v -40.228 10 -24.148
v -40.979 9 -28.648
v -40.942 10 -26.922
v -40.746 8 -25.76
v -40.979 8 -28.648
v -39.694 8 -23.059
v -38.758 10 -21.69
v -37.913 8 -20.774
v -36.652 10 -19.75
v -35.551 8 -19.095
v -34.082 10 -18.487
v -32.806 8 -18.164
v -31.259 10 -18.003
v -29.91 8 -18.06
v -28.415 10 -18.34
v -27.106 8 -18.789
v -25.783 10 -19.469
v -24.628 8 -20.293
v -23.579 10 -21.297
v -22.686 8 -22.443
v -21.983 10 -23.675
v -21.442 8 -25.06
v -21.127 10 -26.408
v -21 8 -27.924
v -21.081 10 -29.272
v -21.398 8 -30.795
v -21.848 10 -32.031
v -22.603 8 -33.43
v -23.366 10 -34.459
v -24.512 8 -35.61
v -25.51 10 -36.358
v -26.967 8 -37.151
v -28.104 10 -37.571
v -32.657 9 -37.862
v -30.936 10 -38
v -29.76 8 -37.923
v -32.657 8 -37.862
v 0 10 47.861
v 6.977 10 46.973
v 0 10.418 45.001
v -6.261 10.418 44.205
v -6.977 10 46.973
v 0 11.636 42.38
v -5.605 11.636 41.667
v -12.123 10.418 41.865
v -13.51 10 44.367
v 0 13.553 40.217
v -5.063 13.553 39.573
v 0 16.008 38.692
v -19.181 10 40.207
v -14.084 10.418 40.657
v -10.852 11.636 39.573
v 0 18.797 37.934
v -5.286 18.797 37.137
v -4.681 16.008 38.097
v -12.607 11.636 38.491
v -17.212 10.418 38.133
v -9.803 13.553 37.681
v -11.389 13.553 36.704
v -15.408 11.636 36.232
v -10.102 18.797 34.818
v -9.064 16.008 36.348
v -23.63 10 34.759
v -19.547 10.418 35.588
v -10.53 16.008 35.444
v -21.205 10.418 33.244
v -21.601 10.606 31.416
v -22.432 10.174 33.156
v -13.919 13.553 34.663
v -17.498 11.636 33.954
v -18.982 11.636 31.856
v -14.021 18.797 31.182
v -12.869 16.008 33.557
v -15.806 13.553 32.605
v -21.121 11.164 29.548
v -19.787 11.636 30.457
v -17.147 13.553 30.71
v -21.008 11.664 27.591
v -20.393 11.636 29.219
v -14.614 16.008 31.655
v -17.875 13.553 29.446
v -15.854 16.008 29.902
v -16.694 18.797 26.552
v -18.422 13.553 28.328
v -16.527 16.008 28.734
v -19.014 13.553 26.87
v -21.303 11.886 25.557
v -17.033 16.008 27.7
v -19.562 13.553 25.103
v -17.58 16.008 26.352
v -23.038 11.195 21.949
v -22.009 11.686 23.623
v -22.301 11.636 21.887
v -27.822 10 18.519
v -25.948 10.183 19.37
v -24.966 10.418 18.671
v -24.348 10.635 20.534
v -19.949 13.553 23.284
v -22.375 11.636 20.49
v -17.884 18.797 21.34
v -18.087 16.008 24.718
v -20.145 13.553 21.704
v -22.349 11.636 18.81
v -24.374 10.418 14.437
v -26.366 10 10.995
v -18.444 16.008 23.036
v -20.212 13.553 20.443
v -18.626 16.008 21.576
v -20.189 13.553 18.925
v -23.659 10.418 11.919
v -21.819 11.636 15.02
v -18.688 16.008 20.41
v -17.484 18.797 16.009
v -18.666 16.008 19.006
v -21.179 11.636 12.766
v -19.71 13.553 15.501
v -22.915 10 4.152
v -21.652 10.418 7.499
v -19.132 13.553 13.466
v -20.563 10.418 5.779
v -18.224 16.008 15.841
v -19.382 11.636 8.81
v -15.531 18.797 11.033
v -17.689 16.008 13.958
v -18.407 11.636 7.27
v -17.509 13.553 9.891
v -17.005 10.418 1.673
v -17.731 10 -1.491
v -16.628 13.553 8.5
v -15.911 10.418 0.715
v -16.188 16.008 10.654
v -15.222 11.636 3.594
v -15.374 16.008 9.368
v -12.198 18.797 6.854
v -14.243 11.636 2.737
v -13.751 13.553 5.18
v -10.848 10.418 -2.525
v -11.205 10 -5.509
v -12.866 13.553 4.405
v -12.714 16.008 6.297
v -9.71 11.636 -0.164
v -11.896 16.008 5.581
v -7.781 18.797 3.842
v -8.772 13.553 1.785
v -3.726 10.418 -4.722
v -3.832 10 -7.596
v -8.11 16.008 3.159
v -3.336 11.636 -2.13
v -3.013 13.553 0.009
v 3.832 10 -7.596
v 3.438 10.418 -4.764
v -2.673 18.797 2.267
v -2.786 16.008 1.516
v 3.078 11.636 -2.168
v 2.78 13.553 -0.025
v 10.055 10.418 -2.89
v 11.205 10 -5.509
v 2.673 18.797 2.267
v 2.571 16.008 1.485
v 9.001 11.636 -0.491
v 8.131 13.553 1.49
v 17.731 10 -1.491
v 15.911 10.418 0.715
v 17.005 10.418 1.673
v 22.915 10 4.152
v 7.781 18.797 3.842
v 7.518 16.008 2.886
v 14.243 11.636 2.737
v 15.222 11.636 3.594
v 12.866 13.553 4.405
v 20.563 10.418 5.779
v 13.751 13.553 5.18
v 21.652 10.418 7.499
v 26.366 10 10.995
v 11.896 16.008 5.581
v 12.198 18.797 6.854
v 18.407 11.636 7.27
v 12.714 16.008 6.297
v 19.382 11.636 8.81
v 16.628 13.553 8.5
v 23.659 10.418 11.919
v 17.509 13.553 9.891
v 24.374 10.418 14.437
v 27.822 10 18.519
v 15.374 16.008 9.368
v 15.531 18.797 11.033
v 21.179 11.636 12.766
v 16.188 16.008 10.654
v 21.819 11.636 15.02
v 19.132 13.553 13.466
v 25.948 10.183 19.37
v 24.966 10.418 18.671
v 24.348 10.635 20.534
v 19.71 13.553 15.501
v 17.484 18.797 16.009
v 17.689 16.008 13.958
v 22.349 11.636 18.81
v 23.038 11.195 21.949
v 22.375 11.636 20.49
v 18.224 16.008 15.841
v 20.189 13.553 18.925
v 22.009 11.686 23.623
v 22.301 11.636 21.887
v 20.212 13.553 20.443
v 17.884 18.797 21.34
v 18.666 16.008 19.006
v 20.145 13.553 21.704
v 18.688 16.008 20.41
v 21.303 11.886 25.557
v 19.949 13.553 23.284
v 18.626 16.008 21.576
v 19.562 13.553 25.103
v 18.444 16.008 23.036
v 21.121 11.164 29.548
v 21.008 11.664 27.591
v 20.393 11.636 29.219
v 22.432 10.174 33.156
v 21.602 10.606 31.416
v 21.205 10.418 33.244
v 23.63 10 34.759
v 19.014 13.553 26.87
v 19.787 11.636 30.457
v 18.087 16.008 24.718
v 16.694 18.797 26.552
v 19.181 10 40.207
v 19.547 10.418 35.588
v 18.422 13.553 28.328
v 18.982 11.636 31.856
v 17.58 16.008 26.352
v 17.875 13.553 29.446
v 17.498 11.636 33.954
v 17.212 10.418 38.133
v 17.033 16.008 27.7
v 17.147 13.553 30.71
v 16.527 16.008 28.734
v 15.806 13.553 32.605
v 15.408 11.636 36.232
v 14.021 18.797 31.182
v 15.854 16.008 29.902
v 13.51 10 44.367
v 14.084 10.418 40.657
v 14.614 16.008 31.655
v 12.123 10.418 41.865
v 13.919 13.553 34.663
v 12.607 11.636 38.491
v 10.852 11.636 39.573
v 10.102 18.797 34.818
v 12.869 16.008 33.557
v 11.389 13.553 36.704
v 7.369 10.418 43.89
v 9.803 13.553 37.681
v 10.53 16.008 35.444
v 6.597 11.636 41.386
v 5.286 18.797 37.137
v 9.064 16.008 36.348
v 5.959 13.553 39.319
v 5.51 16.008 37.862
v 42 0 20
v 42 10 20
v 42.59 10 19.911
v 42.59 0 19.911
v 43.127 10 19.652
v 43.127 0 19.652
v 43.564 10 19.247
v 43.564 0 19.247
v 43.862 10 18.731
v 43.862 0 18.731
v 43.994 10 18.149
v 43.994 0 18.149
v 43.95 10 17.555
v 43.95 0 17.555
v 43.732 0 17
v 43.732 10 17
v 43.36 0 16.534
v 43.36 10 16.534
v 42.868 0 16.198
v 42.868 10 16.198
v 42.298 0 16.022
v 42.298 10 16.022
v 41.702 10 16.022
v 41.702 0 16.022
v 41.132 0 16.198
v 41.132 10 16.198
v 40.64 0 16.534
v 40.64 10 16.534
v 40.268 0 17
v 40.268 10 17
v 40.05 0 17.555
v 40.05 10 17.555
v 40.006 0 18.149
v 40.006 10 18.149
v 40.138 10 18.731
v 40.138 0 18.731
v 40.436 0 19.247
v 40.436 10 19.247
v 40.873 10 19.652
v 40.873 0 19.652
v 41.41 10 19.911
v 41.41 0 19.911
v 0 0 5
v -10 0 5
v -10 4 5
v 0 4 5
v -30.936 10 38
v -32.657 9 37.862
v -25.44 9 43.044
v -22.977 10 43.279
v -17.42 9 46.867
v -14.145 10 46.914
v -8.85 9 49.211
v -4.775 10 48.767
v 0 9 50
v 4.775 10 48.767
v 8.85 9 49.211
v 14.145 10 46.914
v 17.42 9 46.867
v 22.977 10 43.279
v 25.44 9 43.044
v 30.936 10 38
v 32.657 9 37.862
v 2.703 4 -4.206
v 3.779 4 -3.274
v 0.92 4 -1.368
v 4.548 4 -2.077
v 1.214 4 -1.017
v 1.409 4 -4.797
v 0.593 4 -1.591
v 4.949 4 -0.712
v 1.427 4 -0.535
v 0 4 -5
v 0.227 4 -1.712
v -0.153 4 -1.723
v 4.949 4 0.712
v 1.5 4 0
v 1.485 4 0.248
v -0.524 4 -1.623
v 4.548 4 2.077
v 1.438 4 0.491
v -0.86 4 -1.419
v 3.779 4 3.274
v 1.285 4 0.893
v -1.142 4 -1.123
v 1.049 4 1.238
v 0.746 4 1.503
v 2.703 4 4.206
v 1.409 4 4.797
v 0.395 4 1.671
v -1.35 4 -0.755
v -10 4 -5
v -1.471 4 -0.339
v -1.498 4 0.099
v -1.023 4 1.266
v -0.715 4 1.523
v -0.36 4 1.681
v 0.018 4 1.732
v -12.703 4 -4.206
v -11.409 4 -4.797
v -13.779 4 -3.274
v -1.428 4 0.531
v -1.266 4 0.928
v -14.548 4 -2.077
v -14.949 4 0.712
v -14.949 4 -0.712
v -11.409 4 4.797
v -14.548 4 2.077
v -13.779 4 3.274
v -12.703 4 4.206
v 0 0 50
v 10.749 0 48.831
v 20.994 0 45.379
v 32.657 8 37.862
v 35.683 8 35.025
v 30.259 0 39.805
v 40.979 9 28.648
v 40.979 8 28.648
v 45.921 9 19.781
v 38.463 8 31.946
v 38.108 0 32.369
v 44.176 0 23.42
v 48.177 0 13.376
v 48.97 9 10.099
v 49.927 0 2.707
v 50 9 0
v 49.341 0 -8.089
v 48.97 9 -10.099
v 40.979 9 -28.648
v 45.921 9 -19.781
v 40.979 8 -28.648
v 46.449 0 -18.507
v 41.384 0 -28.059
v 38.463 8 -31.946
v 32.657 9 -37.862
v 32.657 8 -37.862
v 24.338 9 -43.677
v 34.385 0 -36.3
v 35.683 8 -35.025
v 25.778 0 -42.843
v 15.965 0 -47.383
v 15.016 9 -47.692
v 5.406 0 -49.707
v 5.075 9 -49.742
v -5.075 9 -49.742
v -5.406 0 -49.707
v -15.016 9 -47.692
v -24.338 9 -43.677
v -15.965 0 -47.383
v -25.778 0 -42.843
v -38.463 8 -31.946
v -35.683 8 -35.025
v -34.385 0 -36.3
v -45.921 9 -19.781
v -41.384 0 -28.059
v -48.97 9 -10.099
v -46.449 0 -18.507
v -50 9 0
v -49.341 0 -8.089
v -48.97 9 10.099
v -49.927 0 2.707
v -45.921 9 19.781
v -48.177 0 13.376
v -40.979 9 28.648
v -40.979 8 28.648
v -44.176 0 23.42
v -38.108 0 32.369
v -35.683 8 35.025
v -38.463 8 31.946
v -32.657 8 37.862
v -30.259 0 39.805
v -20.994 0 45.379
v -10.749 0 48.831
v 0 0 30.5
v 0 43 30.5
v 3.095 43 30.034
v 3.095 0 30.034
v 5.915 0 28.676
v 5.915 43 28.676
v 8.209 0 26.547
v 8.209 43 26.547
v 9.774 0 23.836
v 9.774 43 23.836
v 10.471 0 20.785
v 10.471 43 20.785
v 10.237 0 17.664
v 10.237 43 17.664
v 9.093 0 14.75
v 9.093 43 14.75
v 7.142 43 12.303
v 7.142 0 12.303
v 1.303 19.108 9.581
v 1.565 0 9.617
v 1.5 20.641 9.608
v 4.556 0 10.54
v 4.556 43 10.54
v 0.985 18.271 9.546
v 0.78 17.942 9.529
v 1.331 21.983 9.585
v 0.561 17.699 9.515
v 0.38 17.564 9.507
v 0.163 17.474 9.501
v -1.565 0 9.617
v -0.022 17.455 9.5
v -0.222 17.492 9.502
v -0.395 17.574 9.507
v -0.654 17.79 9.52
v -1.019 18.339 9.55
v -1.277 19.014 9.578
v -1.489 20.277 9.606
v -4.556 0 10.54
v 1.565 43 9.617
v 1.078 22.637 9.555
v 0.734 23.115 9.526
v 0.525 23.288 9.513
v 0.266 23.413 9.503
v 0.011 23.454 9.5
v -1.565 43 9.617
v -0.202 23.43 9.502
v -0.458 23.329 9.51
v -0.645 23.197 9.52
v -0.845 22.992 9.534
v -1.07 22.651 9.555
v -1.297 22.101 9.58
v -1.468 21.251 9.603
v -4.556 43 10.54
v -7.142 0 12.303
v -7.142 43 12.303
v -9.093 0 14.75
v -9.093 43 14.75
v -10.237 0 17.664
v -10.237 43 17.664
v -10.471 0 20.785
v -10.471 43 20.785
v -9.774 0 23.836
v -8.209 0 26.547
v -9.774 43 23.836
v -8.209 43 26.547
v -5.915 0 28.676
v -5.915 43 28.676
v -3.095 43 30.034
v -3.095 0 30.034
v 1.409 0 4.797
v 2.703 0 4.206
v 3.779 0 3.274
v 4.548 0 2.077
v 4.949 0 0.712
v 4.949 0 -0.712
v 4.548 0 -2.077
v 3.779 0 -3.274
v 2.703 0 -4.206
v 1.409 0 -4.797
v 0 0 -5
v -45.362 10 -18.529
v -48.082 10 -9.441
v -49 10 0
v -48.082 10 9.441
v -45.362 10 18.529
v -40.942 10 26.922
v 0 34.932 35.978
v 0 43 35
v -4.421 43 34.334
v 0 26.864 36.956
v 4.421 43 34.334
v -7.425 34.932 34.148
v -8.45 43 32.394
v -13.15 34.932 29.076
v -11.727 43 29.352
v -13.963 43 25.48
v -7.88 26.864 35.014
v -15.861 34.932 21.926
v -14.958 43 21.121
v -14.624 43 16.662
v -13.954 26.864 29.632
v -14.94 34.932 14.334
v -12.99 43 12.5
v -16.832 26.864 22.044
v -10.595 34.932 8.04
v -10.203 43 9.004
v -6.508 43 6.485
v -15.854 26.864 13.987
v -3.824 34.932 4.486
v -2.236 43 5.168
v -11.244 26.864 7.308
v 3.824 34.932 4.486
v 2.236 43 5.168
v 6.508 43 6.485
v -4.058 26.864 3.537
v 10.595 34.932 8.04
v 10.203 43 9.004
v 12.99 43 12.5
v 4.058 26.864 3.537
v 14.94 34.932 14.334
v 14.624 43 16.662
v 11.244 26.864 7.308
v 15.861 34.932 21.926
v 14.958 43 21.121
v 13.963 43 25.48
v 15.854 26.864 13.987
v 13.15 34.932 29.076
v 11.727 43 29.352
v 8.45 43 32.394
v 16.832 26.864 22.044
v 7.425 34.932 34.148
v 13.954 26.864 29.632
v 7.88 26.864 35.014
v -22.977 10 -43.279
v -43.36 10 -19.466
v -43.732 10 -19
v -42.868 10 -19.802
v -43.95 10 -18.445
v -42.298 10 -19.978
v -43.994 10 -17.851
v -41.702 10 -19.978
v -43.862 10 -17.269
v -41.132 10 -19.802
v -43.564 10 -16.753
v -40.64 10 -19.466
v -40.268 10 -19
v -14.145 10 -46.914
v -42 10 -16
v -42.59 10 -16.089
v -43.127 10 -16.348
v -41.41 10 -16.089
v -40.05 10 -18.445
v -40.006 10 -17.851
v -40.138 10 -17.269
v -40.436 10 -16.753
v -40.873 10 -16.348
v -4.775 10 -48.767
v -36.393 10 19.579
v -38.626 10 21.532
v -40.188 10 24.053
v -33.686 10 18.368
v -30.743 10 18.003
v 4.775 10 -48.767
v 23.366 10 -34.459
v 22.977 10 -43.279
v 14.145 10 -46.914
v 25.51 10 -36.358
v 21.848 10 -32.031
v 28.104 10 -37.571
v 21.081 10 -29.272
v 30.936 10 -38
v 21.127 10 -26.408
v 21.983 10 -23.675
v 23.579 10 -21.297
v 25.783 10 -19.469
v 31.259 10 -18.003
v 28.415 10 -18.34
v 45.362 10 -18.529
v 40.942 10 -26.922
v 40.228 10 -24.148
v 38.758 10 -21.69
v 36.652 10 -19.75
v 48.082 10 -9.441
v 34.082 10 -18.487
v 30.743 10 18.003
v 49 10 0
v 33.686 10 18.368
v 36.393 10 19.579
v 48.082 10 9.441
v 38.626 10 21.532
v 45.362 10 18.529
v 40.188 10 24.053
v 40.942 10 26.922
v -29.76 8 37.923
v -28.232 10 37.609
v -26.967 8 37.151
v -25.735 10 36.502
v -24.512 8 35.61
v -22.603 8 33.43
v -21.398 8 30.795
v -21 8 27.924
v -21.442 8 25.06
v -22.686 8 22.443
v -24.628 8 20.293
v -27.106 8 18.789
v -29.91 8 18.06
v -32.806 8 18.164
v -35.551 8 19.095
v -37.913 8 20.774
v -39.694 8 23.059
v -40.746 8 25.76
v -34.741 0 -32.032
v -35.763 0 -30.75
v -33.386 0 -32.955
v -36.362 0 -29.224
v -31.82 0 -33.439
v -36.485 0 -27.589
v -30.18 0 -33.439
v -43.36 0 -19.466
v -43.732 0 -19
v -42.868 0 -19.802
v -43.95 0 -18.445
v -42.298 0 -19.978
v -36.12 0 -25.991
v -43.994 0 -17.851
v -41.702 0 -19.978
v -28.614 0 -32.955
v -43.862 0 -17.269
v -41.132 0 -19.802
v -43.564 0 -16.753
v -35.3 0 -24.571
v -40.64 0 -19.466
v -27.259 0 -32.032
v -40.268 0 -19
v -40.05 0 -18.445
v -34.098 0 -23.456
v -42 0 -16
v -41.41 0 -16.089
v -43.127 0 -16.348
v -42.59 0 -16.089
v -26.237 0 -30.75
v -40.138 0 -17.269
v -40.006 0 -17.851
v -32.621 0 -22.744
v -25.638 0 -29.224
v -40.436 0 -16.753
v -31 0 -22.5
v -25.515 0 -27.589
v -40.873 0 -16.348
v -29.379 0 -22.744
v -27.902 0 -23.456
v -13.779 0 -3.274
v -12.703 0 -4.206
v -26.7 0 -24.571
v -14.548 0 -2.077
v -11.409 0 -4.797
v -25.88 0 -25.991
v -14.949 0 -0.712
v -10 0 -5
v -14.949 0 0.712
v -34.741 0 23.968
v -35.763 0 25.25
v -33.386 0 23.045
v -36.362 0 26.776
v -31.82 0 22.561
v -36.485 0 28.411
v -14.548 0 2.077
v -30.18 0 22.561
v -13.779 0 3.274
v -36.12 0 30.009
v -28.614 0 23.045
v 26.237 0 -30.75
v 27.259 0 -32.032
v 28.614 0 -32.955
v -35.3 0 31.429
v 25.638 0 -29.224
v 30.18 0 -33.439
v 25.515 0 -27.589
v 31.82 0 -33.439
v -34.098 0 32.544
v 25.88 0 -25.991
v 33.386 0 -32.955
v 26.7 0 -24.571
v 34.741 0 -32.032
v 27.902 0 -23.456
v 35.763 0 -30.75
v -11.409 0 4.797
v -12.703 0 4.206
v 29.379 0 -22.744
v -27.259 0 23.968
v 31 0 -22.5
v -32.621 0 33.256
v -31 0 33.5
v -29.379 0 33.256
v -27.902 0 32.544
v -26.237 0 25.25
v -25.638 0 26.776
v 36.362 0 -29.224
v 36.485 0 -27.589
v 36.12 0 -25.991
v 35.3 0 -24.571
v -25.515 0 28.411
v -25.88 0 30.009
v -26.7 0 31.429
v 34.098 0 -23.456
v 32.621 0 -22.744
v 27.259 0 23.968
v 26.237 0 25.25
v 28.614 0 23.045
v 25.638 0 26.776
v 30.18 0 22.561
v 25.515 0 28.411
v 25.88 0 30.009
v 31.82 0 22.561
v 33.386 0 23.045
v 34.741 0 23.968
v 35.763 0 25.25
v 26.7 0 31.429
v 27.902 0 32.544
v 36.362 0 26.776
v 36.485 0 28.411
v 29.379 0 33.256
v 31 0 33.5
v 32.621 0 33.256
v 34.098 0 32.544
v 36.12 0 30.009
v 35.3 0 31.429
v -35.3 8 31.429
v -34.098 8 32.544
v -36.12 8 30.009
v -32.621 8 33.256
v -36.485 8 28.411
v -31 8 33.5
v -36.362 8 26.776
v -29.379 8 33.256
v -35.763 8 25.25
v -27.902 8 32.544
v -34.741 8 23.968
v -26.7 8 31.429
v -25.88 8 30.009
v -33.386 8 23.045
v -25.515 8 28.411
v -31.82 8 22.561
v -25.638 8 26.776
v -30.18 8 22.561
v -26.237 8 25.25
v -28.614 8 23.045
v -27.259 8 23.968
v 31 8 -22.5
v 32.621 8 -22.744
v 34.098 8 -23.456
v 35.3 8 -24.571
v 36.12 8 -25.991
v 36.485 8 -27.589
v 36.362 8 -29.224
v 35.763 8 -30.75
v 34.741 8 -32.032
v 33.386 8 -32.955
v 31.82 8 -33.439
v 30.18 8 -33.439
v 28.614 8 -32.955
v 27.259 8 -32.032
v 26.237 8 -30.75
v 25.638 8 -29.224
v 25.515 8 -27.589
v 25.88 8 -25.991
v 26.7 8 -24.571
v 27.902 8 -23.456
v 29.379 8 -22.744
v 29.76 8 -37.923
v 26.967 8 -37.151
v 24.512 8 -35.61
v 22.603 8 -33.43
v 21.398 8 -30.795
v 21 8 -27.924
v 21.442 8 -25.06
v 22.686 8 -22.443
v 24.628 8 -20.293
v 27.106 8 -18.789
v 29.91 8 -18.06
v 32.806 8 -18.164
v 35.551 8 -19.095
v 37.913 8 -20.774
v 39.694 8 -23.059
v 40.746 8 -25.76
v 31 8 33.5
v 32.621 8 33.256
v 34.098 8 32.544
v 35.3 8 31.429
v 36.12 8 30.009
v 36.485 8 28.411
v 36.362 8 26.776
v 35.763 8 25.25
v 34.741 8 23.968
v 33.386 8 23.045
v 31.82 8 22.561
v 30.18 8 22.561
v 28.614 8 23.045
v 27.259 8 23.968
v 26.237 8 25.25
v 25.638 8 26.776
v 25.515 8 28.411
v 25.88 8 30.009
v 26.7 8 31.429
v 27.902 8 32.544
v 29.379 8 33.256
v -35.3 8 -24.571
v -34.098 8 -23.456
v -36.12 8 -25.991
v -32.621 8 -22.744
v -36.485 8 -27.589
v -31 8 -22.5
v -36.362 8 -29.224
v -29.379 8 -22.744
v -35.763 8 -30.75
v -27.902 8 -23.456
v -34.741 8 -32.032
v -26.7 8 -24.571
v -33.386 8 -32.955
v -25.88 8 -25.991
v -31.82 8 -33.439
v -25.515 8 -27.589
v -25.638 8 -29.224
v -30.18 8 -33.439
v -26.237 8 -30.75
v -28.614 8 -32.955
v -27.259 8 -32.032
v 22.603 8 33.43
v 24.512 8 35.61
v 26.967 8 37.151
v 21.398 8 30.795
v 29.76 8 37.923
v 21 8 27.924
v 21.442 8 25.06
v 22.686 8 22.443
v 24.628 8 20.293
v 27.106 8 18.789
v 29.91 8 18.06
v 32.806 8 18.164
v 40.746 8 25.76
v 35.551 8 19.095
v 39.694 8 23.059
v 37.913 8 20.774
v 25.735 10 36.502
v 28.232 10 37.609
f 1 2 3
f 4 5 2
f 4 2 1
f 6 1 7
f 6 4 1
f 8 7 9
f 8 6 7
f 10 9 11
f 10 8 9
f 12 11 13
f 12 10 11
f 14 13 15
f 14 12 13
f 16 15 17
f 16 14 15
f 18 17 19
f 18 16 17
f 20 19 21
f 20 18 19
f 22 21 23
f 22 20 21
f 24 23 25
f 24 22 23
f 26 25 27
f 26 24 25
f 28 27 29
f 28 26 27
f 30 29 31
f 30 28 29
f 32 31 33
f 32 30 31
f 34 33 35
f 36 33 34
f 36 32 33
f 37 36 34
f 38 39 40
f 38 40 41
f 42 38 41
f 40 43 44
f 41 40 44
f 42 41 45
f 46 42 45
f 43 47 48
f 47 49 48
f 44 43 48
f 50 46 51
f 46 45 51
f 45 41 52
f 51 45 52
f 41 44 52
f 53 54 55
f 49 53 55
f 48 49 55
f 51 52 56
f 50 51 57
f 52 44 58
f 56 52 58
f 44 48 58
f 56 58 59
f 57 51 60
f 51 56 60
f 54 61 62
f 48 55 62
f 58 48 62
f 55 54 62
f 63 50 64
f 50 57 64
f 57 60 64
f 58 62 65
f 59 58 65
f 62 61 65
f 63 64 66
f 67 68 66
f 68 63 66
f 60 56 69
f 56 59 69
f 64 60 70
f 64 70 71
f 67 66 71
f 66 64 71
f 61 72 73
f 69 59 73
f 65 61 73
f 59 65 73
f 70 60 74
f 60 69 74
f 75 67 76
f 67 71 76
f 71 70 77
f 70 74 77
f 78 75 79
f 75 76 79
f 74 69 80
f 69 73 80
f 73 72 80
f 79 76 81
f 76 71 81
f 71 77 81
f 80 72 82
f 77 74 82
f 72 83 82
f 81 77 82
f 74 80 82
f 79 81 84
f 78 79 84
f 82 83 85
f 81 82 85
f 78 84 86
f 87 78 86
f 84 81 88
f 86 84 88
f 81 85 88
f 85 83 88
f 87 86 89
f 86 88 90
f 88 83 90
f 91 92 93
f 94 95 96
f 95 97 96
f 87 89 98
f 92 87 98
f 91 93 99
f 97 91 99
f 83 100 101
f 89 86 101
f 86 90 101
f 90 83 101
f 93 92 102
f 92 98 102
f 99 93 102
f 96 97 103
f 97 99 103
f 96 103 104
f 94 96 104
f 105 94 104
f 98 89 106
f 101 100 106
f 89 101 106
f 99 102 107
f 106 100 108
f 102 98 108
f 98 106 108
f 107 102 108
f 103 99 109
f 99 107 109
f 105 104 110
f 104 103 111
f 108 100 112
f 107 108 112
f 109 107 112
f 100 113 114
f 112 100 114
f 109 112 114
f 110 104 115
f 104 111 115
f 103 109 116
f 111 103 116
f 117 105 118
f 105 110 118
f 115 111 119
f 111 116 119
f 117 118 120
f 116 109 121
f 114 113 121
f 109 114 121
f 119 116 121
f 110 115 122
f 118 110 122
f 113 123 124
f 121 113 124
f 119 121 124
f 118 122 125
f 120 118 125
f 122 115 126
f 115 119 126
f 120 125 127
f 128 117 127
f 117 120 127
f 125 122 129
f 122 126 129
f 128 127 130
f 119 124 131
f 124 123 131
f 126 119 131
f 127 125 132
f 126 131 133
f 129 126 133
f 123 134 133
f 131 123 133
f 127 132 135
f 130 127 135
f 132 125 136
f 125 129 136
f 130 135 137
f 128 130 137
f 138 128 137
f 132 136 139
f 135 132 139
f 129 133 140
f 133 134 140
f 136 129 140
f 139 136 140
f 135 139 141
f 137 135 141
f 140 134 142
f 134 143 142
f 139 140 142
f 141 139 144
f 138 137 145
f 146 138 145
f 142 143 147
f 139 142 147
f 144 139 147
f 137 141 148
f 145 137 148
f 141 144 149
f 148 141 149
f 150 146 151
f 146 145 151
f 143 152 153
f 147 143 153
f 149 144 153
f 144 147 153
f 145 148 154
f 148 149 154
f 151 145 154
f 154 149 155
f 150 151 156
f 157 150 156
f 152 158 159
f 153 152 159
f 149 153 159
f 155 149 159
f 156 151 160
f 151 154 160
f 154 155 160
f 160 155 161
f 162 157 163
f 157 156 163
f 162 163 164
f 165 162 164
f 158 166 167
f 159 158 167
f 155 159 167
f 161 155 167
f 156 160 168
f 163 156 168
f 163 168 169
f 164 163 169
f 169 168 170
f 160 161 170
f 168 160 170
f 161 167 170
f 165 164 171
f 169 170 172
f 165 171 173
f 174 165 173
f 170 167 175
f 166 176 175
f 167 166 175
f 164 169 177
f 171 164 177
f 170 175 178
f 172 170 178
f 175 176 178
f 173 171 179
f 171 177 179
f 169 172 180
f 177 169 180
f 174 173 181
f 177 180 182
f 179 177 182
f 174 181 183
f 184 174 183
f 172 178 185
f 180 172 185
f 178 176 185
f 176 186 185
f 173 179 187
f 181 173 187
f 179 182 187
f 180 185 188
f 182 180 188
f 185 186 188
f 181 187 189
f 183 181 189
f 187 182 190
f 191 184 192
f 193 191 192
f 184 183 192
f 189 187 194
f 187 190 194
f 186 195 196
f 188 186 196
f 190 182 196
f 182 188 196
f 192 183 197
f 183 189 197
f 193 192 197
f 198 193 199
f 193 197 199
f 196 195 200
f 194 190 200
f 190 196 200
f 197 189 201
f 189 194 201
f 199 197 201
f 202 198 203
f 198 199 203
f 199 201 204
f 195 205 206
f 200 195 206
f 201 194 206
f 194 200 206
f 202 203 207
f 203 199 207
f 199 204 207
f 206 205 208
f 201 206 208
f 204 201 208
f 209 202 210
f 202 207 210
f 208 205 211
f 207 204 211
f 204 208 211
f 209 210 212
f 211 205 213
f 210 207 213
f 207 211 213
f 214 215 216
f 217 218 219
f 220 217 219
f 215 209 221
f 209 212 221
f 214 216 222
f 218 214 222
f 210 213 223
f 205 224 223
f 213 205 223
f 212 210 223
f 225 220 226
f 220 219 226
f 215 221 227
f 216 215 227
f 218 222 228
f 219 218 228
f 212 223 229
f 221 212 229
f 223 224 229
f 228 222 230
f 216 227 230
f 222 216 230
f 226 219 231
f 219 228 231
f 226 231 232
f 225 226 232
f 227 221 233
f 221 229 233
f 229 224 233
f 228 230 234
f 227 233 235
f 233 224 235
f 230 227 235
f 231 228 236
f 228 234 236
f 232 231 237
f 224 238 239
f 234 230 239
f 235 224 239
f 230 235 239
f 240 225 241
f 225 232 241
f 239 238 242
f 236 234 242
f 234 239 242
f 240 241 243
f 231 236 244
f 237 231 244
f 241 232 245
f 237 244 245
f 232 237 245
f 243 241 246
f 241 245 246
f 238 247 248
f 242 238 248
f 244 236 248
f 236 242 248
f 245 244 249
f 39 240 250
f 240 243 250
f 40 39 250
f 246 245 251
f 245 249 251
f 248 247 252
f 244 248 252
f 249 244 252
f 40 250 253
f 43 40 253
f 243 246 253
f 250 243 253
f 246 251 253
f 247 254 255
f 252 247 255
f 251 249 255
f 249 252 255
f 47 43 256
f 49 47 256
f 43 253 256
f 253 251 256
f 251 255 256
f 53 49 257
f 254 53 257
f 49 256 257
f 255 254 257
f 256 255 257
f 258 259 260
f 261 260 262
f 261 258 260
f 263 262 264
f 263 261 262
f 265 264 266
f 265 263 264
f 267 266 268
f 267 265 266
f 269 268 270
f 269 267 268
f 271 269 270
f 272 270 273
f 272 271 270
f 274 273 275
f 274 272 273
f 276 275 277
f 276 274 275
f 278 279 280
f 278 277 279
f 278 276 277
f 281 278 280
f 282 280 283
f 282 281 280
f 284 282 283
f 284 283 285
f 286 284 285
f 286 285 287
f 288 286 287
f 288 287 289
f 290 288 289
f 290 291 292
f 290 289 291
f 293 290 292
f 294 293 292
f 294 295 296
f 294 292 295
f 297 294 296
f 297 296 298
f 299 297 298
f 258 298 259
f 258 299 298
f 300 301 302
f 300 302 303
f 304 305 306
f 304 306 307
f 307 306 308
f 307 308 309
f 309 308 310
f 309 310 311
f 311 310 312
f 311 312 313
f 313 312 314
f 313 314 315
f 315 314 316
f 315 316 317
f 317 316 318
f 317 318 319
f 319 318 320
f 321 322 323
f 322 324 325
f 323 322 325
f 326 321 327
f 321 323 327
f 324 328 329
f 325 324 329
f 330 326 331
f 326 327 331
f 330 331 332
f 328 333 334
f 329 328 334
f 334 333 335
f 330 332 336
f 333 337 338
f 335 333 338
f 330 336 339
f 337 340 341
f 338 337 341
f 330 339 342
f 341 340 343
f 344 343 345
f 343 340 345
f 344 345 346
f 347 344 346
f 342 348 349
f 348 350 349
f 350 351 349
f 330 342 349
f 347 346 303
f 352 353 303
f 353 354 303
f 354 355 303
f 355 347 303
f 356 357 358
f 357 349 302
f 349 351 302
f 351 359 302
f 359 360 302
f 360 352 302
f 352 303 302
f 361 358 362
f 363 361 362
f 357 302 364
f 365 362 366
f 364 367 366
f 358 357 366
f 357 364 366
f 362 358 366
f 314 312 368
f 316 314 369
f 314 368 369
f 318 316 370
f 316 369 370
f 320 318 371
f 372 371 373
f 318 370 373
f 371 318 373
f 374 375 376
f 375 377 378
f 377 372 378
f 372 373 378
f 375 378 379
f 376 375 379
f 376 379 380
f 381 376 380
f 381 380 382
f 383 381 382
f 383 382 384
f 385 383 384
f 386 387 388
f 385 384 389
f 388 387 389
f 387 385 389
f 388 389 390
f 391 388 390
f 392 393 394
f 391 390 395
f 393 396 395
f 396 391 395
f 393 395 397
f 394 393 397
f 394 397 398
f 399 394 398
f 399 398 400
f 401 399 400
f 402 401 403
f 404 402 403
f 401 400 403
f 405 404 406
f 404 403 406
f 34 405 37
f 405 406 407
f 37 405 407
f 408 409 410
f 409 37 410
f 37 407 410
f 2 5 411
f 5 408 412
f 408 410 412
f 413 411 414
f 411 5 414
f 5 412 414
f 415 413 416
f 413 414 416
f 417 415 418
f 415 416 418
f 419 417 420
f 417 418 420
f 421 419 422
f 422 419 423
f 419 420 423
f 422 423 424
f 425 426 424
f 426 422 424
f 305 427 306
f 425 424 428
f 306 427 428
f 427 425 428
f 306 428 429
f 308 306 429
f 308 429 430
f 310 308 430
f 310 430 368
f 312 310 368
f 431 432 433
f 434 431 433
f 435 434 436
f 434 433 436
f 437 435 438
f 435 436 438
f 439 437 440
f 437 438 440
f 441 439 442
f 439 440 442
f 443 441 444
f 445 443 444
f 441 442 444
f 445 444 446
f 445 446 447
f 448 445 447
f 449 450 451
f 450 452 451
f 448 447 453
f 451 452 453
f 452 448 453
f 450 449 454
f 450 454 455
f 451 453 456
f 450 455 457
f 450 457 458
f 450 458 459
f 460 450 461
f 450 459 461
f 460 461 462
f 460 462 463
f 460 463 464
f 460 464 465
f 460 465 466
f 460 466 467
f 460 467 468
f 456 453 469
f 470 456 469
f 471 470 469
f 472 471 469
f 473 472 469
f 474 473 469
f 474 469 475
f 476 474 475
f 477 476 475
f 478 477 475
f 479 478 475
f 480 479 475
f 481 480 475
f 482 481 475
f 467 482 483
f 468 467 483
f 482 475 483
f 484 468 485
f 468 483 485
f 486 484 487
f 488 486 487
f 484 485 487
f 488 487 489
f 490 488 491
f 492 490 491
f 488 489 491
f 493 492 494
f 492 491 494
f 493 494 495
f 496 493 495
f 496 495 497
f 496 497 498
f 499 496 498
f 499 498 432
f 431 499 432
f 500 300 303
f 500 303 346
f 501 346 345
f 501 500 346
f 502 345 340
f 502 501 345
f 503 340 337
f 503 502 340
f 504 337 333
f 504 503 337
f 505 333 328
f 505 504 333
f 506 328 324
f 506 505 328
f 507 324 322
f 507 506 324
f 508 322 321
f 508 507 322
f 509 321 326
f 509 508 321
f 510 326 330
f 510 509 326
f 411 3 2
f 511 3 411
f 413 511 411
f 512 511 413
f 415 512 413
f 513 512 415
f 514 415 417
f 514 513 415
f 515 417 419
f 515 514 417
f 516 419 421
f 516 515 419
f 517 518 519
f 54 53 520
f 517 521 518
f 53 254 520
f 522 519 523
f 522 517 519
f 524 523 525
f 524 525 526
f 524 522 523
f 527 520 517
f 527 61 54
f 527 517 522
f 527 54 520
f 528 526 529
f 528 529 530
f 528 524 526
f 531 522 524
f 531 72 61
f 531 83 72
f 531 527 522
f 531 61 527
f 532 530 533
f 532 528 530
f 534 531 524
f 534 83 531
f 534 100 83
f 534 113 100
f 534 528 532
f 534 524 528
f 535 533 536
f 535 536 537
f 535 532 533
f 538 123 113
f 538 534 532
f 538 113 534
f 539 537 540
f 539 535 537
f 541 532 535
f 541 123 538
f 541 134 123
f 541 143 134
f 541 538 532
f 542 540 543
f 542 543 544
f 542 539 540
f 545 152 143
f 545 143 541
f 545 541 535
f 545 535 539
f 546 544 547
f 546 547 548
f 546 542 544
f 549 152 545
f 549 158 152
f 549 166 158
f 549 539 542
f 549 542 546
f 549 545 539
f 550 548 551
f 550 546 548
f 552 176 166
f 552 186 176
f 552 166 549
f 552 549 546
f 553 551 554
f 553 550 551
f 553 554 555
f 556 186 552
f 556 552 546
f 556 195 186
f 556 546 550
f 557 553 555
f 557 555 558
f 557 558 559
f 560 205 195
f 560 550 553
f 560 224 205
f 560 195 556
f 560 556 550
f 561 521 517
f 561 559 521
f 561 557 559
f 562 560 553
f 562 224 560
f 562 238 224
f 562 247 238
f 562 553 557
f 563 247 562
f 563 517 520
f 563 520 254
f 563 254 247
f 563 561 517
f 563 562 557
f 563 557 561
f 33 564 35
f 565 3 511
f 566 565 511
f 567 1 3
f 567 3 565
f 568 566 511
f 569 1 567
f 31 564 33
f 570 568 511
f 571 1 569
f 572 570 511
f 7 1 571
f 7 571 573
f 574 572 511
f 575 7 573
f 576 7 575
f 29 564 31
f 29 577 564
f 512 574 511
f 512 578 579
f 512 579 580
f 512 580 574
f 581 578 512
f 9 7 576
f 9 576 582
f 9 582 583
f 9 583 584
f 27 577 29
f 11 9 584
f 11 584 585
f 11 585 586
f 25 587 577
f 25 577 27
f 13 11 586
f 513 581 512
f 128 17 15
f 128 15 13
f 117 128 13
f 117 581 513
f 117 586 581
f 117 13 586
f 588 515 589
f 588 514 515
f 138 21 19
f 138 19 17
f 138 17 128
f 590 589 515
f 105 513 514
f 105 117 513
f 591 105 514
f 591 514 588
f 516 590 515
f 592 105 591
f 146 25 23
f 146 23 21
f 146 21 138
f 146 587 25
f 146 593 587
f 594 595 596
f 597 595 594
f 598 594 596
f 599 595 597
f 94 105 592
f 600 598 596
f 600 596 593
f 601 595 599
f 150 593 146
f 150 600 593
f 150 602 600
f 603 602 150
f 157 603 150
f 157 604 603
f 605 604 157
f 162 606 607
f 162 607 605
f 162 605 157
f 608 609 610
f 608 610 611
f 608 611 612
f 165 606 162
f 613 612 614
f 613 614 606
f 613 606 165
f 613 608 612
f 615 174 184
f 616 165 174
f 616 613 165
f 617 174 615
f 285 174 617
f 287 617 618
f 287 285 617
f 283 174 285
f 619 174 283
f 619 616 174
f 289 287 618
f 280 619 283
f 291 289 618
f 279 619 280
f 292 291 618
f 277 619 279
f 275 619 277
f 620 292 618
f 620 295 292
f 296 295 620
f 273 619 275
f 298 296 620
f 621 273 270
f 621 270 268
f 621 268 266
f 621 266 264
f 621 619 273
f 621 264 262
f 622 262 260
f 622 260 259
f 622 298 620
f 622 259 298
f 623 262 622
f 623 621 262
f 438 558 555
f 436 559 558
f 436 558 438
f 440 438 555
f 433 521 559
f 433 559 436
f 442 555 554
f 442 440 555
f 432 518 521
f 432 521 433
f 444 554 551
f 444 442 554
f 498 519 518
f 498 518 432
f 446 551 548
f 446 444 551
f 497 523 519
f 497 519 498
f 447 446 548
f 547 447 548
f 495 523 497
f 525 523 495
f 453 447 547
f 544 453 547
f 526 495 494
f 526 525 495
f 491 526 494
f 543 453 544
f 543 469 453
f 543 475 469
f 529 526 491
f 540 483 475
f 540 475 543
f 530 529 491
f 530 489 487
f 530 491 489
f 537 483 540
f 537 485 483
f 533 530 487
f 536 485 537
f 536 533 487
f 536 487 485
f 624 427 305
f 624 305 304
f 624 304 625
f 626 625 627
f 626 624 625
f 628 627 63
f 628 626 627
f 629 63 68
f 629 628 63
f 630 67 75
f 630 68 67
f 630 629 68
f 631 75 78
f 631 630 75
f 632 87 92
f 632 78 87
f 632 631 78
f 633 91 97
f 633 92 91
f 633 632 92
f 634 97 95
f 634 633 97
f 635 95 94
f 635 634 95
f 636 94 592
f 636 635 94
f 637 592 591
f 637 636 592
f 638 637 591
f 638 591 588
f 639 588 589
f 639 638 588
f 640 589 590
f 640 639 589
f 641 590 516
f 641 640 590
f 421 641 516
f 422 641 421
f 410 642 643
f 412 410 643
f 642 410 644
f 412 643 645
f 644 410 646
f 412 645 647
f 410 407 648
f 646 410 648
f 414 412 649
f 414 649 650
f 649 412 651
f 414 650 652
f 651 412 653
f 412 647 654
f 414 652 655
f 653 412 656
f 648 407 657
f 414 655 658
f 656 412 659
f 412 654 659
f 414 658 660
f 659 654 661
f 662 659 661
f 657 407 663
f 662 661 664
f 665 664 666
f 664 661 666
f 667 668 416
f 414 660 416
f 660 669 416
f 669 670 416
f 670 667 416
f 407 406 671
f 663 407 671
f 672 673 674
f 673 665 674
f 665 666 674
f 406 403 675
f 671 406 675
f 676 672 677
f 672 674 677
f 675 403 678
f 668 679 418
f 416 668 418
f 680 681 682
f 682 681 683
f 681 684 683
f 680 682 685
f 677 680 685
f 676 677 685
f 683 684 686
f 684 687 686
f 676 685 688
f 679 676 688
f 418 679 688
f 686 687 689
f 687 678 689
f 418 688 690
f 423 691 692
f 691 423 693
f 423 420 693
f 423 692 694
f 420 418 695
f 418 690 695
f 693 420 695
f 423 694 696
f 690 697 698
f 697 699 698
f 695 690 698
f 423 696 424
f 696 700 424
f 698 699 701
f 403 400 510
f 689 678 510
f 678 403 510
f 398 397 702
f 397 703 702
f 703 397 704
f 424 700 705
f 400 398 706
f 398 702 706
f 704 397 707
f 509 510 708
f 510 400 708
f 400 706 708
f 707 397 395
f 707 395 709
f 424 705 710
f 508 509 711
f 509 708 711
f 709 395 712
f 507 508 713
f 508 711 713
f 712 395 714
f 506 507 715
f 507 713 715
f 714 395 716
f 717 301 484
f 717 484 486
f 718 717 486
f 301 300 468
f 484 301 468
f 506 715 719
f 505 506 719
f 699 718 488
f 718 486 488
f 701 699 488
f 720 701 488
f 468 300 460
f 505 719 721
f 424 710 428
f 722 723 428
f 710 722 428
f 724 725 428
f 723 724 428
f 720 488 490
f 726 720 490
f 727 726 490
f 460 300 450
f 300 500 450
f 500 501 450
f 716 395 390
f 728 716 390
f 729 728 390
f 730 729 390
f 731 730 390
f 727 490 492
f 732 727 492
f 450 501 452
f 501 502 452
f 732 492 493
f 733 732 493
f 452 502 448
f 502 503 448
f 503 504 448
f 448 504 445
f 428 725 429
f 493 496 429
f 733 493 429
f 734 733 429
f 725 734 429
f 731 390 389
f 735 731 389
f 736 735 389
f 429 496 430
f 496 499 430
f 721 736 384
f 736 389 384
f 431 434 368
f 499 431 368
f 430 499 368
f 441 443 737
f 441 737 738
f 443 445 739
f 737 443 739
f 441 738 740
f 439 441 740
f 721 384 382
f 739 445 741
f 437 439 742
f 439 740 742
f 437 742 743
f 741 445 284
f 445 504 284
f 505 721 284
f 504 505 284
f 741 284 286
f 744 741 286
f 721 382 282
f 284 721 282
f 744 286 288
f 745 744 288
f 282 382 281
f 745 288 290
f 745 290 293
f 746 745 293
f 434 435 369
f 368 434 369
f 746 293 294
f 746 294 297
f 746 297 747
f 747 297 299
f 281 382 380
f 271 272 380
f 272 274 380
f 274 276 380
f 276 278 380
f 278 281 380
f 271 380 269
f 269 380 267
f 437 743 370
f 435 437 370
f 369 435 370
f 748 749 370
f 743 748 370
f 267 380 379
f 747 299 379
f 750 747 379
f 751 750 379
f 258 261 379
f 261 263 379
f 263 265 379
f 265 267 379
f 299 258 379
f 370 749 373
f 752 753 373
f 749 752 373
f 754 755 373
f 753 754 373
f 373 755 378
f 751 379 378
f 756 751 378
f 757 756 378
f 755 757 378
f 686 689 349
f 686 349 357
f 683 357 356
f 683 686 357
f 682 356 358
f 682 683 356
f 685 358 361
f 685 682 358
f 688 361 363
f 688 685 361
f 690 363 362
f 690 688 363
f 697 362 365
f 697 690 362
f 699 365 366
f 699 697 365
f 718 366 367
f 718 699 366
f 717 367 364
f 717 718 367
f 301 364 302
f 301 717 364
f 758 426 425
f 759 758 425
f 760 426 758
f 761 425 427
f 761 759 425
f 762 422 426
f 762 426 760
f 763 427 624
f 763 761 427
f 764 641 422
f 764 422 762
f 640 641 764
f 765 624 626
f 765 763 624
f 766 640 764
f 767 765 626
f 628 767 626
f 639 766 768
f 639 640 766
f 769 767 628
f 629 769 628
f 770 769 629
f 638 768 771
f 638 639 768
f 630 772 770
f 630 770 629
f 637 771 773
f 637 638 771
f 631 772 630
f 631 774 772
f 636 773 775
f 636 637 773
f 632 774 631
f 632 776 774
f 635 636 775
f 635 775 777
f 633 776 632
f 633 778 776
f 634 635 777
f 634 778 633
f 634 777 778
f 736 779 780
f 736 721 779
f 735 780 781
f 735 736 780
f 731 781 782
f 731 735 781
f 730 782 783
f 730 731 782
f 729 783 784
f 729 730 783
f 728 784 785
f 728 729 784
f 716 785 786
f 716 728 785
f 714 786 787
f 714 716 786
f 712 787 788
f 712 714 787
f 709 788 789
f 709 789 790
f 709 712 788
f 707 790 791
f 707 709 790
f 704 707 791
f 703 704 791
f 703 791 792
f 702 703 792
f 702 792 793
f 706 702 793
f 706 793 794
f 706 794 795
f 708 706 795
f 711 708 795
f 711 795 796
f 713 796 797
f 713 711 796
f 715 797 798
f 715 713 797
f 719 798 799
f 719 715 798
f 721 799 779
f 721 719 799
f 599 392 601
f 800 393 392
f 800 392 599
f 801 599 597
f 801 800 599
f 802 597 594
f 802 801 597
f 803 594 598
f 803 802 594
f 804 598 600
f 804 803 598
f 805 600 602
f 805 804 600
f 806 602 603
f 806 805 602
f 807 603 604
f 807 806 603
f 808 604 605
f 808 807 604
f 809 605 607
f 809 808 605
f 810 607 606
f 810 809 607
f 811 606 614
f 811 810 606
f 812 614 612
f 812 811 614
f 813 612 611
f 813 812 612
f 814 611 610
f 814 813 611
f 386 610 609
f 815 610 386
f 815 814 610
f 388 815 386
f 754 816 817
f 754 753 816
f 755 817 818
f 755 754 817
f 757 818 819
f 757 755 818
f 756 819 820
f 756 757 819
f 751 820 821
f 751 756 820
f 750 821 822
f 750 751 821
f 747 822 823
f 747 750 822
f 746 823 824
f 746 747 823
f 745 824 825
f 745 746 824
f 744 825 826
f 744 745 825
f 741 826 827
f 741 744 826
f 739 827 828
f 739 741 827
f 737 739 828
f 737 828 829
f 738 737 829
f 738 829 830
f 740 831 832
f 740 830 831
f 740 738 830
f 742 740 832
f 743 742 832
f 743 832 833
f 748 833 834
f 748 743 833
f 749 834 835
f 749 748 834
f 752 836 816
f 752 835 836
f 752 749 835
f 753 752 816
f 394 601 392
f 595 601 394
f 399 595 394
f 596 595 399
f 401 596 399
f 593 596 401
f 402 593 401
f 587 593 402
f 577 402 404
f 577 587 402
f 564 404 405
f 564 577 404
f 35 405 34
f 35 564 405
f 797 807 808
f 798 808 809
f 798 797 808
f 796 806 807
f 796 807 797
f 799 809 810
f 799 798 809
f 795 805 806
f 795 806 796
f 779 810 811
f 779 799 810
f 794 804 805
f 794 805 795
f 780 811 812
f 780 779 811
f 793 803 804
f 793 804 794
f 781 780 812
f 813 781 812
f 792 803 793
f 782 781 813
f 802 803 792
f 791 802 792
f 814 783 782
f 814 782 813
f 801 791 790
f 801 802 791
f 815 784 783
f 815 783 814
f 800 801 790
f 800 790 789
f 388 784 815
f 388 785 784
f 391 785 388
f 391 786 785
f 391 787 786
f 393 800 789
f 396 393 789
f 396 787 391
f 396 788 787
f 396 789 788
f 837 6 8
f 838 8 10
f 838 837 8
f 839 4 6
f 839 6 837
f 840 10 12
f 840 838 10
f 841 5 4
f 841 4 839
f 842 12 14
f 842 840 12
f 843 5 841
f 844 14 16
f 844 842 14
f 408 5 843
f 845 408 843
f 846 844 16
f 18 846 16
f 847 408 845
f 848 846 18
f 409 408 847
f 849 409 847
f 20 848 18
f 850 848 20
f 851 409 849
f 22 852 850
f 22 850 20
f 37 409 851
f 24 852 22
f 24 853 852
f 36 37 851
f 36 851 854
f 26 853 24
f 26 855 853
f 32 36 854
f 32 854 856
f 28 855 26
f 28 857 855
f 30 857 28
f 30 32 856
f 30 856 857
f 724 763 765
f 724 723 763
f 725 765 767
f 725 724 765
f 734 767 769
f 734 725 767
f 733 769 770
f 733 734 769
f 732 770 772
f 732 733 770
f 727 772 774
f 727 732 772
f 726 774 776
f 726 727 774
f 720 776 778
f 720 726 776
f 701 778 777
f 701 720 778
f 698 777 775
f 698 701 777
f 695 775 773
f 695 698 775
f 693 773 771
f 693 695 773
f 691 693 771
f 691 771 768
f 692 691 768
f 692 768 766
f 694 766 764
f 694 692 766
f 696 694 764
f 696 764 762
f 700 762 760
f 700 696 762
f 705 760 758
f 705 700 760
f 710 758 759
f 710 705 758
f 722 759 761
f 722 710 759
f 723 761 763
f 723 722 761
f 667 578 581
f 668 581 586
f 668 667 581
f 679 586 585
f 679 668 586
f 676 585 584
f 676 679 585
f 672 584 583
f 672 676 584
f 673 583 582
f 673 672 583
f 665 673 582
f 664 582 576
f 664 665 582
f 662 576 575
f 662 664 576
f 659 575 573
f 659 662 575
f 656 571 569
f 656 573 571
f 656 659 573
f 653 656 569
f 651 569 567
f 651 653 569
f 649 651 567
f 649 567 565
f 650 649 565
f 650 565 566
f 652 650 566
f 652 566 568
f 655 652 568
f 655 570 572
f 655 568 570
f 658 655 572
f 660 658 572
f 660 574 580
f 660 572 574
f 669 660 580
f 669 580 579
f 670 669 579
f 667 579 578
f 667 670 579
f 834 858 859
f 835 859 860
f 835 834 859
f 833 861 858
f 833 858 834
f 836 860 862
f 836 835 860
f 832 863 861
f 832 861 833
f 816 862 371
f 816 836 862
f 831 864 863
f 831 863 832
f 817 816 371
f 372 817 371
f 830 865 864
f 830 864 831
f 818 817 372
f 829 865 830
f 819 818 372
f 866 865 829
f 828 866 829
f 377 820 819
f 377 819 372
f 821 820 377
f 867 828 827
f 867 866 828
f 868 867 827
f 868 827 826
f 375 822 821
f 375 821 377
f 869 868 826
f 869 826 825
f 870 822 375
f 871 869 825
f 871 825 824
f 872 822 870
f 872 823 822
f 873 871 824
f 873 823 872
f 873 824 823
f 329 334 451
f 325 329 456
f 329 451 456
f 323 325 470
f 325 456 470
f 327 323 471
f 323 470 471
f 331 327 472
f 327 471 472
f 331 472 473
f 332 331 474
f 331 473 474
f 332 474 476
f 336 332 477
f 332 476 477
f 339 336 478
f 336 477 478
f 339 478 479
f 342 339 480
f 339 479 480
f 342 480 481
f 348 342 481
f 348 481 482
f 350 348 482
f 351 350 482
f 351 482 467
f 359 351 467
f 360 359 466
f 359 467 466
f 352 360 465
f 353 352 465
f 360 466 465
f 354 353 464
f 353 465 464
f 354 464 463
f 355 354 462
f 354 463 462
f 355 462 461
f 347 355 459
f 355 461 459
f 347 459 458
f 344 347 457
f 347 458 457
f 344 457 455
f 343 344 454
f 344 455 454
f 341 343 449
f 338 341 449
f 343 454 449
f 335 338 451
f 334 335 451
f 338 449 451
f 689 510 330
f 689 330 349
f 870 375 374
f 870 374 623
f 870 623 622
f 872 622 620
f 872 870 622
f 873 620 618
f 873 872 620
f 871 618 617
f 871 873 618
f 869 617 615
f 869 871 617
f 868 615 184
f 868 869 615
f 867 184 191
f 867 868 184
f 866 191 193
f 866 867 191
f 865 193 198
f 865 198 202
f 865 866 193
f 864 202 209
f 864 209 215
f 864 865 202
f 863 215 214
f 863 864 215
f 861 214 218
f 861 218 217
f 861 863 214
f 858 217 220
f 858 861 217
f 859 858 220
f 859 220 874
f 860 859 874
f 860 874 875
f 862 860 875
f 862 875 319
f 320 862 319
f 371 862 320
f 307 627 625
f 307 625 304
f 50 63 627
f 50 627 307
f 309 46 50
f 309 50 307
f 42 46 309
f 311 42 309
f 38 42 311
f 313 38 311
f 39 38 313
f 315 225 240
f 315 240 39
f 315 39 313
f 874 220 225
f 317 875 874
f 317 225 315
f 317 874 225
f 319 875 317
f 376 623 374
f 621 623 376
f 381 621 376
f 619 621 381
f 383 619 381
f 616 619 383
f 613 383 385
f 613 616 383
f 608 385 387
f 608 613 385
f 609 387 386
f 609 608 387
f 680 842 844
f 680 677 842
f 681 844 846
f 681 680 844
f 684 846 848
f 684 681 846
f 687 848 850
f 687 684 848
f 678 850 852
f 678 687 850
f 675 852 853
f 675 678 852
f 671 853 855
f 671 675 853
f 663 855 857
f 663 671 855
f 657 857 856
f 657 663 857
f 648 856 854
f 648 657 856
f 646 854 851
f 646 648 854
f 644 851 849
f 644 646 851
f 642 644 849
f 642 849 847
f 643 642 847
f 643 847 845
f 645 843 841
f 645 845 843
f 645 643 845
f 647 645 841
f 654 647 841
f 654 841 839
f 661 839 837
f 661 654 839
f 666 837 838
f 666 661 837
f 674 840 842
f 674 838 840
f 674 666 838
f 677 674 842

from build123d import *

# Parameters (mm, degrees)
SKETCH_1_R               = 50
EXTRUDE_1_DEPTH          = 10
FILLET_1_R               = 10
F_1_UN_DEPTH             = 79.0320447
F_1_UN_DEPTH_BACK        = 2
SKETCH_2_R               = 10
SKETCH_2_R_2             = 5.5
CUT_EXTRUDE_3_DEPTH      = 79.0320447
CUT_EXTRUDE_3_DEPTH_BACK = 79.0320447
SKETCH_2_3_R             = 5.5
SKETCH_6_R               = 10.5
CUT_EXTRUDE_4_DEPTH      = 83.758685345
SKETCH_7_R               = 2
CUT_EXTRUDE_6_DEPTH      = 83.758685345
CUT_EXTRUDE_7_DEPTH      = 4
SWEEP_1_OUTLINE_W        = 1.5
SWEEP_1_OUTLINE_H        = 22.476650491
CHAMFER_2_SIZE           = 1


# Read off the part's stored shape, not the designer's step: 切除-扫描1
with BuildPart() as part:
    # 草图1 → 凸台-拉伸1 (new body)
    with BuildSketch(Plane(origin=(0, 0, 0), x_dir=(1, 0, 0), z_dir=(0, 1, 0))):
        with Locations(Location((0, 0, 0), (0, 0, 270))):
            Circle(SKETCH_1_R)
    extrude(amount=EXTRUDE_1_DEPTH)

    # 草图5 → 旋转1 (revolve)
    with BuildSketch(Plane(origin=(0, 0, 0), x_dir=(0, 0, -1), z_dir=(1, 0, 0))):
        Polygon((-20, 10), (-20, 43), (-35, 43), (-39, 10), align=None)
    revolve(axis=Axis((0, 37.278151035, 20), (0, -1, 0)))

    # 圆角1
    fillet_1_edges = [part.edges().sort_by_distance(p)[0] for p in [
        (0, 10, 1),
    ]]
    fillet(fillet_1_edges, radius=FILLET_1_R)

    # 草图2 → 切除-拉伸1 un (cut, two sides: drawn at the far end of the back side and taken through both)
    # profile 1 of 4: a face of its own
    with BuildSketch(Plane(origin=(0, 10, 0), x_dir=(1, 0, 0), z_dir=(0, 1, 0)).offset(-F_1_UN_DEPTH_BACK)):
        with Locations((31, 28)):
            Circle(SKETCH_2_R)
        with Locations(Location((31, 28, 0), (0, 0, 270))):
            Circle(SKETCH_2_R_2, mode=Mode.SUBTRACT)
    # profile 2 of 4: a face of its own
    with BuildSketch(Plane(origin=(0, 10, 0), x_dir=(1, 0, 0), z_dir=(0, 1, 0)).offset(-F_1_UN_DEPTH_BACK)):
        with Locations((-31, 28)):
            Circle(SKETCH_2_R)
        with Locations(Location((-31, 28, 0), (0, 0, 90))):
            Circle(SKETCH_2_R_2, mode=Mode.SUBTRACT)
    # profile 3 of 4: a face of its own
    with BuildSketch(Plane(origin=(0, 10, 0), x_dir=(1, 0, 0), z_dir=(0, 1, 0)).offset(-F_1_UN_DEPTH_BACK)):
        with Locations((-31, -28)):
            Circle(SKETCH_2_R)
        with Locations(Location((-31, -28, 0), (0, 0, 52.073353544))):
            Circle(SKETCH_2_R_2, mode=Mode.SUBTRACT)
    # profile 4 of 4: a face of its own
    with BuildSketch(Plane(origin=(0, 10, 0), x_dir=(1, 0, 0), z_dir=(0, 1, 0)).offset(-F_1_UN_DEPTH_BACK)):
        with Locations((31, -28)):
            Circle(SKETCH_2_R)
        with Locations(Location((31, -28, 0), (0, 0, 90))):
            Circle(SKETCH_2_R_2, mode=Mode.SUBTRACT)
    extrude(amount=F_1_UN_DEPTH + F_1_UN_DEPTH_BACK, mode=Mode.SUBTRACT)

    # 草图2<3> → 切除-拉伸3 (cut, two sides: drawn at the far end of the back side and taken through both)
    with BuildSketch(Plane(origin=(0, 10, 0), x_dir=(1, 0, 0), z_dir=(0, 1, 0)).offset(-CUT_EXTRUDE_3_DEPTH_BACK)):
        with Locations(Location((31, 28, 0), (0, 0, 270))):
            Circle(SKETCH_2_3_R)
        with Locations(Location((-31, 28, 0), (0, 0, 270))):
            Circle(SKETCH_2_3_R)
        with Locations(Location((-31, -28, 0), (0, 0, 270))):
            Circle(SKETCH_2_3_R)
        with Locations(Location((31, -28, 0), (0, 0, 270))):
            Circle(SKETCH_2_3_R)
    extrude(amount=CUT_EXTRUDE_3_DEPTH + CUT_EXTRUDE_3_DEPTH_BACK, mode=Mode.SUBTRACT)

    # 草图6 → 切除-拉伸4 (cut, through all)
    with BuildSketch(Plane(origin=(0, 43, 0), x_dir=(1, 0, 0), z_dir=(0, 1, 0))):
        with Locations(Location((0, -20, 0), (0, 0, 270))):
            Circle(SKETCH_6_R)
    extrude(amount=-CUT_EXTRUDE_4_DEPTH, mode=Mode.SUBTRACT)

    # 草图7 → 切除-拉伸6 (cut, through all)
    with BuildSketch(Plane(origin=(0, 0, 0), x_dir=(1, 0, 0), z_dir=(0, 1, 0))):
        with Locations(Location((42, -18, 0), (0, 0, 270))):
            Circle(SKETCH_7_R)
        with Locations(Location((-42, 18, 0), (0, 0, 270))):
            Circle(SKETCH_7_R)
    extrude(amount=CUT_EXTRUDE_6_DEPTH, mode=Mode.SUBTRACT)

    # 草图8 → 切除-拉伸7 (cut)
    with BuildSketch(Plane.XZ):
        with BuildLine():
            Line((0, -5), (-10, -5))
            ThreePointArc((-10, -5), (-15, 0), (-10, 5))
            Line((-10, 5), (0, 5))
            ThreePointArc((0, 5), (5, 0), (0, -5))
        make_face()
    extrude(amount=-CUT_EXTRUDE_7_DEPTH, mode=Mode.SUBTRACT)

    # 切除-扫描1 outline → 切除-扫描1 (revolve, cut)
    with BuildSketch(Plane(origin=(0, 1, -1.732050808), x_dir=(1, 0, 0), z_dir=(0, -0.5000000000000042, 0.8660254037844363))):
        with Locations((0.75, 13.824548036)):
            Rectangle(SWEEP_1_OUTLINE_W, SWEEP_1_OUTLINE_H)
    revolve(axis=Axis((0, 1, -1.732050808), (0, 0.8660254037844363, 0.5000000000000042)), mode=Mode.SUBTRACT)

    # 倒角2
    chamfer_2_edges = [part.edges().sort_by_distance(p)[0] for p in [
        (50, 10, 0),
        (0, 10, -50),
        (-50, 10, 0),
        (17.420003831, 10, 46.867296343),
    ]]
    chamfer(chamfer_2_edges, length=CHAMFER_2_SIZE)


solid = part.part
